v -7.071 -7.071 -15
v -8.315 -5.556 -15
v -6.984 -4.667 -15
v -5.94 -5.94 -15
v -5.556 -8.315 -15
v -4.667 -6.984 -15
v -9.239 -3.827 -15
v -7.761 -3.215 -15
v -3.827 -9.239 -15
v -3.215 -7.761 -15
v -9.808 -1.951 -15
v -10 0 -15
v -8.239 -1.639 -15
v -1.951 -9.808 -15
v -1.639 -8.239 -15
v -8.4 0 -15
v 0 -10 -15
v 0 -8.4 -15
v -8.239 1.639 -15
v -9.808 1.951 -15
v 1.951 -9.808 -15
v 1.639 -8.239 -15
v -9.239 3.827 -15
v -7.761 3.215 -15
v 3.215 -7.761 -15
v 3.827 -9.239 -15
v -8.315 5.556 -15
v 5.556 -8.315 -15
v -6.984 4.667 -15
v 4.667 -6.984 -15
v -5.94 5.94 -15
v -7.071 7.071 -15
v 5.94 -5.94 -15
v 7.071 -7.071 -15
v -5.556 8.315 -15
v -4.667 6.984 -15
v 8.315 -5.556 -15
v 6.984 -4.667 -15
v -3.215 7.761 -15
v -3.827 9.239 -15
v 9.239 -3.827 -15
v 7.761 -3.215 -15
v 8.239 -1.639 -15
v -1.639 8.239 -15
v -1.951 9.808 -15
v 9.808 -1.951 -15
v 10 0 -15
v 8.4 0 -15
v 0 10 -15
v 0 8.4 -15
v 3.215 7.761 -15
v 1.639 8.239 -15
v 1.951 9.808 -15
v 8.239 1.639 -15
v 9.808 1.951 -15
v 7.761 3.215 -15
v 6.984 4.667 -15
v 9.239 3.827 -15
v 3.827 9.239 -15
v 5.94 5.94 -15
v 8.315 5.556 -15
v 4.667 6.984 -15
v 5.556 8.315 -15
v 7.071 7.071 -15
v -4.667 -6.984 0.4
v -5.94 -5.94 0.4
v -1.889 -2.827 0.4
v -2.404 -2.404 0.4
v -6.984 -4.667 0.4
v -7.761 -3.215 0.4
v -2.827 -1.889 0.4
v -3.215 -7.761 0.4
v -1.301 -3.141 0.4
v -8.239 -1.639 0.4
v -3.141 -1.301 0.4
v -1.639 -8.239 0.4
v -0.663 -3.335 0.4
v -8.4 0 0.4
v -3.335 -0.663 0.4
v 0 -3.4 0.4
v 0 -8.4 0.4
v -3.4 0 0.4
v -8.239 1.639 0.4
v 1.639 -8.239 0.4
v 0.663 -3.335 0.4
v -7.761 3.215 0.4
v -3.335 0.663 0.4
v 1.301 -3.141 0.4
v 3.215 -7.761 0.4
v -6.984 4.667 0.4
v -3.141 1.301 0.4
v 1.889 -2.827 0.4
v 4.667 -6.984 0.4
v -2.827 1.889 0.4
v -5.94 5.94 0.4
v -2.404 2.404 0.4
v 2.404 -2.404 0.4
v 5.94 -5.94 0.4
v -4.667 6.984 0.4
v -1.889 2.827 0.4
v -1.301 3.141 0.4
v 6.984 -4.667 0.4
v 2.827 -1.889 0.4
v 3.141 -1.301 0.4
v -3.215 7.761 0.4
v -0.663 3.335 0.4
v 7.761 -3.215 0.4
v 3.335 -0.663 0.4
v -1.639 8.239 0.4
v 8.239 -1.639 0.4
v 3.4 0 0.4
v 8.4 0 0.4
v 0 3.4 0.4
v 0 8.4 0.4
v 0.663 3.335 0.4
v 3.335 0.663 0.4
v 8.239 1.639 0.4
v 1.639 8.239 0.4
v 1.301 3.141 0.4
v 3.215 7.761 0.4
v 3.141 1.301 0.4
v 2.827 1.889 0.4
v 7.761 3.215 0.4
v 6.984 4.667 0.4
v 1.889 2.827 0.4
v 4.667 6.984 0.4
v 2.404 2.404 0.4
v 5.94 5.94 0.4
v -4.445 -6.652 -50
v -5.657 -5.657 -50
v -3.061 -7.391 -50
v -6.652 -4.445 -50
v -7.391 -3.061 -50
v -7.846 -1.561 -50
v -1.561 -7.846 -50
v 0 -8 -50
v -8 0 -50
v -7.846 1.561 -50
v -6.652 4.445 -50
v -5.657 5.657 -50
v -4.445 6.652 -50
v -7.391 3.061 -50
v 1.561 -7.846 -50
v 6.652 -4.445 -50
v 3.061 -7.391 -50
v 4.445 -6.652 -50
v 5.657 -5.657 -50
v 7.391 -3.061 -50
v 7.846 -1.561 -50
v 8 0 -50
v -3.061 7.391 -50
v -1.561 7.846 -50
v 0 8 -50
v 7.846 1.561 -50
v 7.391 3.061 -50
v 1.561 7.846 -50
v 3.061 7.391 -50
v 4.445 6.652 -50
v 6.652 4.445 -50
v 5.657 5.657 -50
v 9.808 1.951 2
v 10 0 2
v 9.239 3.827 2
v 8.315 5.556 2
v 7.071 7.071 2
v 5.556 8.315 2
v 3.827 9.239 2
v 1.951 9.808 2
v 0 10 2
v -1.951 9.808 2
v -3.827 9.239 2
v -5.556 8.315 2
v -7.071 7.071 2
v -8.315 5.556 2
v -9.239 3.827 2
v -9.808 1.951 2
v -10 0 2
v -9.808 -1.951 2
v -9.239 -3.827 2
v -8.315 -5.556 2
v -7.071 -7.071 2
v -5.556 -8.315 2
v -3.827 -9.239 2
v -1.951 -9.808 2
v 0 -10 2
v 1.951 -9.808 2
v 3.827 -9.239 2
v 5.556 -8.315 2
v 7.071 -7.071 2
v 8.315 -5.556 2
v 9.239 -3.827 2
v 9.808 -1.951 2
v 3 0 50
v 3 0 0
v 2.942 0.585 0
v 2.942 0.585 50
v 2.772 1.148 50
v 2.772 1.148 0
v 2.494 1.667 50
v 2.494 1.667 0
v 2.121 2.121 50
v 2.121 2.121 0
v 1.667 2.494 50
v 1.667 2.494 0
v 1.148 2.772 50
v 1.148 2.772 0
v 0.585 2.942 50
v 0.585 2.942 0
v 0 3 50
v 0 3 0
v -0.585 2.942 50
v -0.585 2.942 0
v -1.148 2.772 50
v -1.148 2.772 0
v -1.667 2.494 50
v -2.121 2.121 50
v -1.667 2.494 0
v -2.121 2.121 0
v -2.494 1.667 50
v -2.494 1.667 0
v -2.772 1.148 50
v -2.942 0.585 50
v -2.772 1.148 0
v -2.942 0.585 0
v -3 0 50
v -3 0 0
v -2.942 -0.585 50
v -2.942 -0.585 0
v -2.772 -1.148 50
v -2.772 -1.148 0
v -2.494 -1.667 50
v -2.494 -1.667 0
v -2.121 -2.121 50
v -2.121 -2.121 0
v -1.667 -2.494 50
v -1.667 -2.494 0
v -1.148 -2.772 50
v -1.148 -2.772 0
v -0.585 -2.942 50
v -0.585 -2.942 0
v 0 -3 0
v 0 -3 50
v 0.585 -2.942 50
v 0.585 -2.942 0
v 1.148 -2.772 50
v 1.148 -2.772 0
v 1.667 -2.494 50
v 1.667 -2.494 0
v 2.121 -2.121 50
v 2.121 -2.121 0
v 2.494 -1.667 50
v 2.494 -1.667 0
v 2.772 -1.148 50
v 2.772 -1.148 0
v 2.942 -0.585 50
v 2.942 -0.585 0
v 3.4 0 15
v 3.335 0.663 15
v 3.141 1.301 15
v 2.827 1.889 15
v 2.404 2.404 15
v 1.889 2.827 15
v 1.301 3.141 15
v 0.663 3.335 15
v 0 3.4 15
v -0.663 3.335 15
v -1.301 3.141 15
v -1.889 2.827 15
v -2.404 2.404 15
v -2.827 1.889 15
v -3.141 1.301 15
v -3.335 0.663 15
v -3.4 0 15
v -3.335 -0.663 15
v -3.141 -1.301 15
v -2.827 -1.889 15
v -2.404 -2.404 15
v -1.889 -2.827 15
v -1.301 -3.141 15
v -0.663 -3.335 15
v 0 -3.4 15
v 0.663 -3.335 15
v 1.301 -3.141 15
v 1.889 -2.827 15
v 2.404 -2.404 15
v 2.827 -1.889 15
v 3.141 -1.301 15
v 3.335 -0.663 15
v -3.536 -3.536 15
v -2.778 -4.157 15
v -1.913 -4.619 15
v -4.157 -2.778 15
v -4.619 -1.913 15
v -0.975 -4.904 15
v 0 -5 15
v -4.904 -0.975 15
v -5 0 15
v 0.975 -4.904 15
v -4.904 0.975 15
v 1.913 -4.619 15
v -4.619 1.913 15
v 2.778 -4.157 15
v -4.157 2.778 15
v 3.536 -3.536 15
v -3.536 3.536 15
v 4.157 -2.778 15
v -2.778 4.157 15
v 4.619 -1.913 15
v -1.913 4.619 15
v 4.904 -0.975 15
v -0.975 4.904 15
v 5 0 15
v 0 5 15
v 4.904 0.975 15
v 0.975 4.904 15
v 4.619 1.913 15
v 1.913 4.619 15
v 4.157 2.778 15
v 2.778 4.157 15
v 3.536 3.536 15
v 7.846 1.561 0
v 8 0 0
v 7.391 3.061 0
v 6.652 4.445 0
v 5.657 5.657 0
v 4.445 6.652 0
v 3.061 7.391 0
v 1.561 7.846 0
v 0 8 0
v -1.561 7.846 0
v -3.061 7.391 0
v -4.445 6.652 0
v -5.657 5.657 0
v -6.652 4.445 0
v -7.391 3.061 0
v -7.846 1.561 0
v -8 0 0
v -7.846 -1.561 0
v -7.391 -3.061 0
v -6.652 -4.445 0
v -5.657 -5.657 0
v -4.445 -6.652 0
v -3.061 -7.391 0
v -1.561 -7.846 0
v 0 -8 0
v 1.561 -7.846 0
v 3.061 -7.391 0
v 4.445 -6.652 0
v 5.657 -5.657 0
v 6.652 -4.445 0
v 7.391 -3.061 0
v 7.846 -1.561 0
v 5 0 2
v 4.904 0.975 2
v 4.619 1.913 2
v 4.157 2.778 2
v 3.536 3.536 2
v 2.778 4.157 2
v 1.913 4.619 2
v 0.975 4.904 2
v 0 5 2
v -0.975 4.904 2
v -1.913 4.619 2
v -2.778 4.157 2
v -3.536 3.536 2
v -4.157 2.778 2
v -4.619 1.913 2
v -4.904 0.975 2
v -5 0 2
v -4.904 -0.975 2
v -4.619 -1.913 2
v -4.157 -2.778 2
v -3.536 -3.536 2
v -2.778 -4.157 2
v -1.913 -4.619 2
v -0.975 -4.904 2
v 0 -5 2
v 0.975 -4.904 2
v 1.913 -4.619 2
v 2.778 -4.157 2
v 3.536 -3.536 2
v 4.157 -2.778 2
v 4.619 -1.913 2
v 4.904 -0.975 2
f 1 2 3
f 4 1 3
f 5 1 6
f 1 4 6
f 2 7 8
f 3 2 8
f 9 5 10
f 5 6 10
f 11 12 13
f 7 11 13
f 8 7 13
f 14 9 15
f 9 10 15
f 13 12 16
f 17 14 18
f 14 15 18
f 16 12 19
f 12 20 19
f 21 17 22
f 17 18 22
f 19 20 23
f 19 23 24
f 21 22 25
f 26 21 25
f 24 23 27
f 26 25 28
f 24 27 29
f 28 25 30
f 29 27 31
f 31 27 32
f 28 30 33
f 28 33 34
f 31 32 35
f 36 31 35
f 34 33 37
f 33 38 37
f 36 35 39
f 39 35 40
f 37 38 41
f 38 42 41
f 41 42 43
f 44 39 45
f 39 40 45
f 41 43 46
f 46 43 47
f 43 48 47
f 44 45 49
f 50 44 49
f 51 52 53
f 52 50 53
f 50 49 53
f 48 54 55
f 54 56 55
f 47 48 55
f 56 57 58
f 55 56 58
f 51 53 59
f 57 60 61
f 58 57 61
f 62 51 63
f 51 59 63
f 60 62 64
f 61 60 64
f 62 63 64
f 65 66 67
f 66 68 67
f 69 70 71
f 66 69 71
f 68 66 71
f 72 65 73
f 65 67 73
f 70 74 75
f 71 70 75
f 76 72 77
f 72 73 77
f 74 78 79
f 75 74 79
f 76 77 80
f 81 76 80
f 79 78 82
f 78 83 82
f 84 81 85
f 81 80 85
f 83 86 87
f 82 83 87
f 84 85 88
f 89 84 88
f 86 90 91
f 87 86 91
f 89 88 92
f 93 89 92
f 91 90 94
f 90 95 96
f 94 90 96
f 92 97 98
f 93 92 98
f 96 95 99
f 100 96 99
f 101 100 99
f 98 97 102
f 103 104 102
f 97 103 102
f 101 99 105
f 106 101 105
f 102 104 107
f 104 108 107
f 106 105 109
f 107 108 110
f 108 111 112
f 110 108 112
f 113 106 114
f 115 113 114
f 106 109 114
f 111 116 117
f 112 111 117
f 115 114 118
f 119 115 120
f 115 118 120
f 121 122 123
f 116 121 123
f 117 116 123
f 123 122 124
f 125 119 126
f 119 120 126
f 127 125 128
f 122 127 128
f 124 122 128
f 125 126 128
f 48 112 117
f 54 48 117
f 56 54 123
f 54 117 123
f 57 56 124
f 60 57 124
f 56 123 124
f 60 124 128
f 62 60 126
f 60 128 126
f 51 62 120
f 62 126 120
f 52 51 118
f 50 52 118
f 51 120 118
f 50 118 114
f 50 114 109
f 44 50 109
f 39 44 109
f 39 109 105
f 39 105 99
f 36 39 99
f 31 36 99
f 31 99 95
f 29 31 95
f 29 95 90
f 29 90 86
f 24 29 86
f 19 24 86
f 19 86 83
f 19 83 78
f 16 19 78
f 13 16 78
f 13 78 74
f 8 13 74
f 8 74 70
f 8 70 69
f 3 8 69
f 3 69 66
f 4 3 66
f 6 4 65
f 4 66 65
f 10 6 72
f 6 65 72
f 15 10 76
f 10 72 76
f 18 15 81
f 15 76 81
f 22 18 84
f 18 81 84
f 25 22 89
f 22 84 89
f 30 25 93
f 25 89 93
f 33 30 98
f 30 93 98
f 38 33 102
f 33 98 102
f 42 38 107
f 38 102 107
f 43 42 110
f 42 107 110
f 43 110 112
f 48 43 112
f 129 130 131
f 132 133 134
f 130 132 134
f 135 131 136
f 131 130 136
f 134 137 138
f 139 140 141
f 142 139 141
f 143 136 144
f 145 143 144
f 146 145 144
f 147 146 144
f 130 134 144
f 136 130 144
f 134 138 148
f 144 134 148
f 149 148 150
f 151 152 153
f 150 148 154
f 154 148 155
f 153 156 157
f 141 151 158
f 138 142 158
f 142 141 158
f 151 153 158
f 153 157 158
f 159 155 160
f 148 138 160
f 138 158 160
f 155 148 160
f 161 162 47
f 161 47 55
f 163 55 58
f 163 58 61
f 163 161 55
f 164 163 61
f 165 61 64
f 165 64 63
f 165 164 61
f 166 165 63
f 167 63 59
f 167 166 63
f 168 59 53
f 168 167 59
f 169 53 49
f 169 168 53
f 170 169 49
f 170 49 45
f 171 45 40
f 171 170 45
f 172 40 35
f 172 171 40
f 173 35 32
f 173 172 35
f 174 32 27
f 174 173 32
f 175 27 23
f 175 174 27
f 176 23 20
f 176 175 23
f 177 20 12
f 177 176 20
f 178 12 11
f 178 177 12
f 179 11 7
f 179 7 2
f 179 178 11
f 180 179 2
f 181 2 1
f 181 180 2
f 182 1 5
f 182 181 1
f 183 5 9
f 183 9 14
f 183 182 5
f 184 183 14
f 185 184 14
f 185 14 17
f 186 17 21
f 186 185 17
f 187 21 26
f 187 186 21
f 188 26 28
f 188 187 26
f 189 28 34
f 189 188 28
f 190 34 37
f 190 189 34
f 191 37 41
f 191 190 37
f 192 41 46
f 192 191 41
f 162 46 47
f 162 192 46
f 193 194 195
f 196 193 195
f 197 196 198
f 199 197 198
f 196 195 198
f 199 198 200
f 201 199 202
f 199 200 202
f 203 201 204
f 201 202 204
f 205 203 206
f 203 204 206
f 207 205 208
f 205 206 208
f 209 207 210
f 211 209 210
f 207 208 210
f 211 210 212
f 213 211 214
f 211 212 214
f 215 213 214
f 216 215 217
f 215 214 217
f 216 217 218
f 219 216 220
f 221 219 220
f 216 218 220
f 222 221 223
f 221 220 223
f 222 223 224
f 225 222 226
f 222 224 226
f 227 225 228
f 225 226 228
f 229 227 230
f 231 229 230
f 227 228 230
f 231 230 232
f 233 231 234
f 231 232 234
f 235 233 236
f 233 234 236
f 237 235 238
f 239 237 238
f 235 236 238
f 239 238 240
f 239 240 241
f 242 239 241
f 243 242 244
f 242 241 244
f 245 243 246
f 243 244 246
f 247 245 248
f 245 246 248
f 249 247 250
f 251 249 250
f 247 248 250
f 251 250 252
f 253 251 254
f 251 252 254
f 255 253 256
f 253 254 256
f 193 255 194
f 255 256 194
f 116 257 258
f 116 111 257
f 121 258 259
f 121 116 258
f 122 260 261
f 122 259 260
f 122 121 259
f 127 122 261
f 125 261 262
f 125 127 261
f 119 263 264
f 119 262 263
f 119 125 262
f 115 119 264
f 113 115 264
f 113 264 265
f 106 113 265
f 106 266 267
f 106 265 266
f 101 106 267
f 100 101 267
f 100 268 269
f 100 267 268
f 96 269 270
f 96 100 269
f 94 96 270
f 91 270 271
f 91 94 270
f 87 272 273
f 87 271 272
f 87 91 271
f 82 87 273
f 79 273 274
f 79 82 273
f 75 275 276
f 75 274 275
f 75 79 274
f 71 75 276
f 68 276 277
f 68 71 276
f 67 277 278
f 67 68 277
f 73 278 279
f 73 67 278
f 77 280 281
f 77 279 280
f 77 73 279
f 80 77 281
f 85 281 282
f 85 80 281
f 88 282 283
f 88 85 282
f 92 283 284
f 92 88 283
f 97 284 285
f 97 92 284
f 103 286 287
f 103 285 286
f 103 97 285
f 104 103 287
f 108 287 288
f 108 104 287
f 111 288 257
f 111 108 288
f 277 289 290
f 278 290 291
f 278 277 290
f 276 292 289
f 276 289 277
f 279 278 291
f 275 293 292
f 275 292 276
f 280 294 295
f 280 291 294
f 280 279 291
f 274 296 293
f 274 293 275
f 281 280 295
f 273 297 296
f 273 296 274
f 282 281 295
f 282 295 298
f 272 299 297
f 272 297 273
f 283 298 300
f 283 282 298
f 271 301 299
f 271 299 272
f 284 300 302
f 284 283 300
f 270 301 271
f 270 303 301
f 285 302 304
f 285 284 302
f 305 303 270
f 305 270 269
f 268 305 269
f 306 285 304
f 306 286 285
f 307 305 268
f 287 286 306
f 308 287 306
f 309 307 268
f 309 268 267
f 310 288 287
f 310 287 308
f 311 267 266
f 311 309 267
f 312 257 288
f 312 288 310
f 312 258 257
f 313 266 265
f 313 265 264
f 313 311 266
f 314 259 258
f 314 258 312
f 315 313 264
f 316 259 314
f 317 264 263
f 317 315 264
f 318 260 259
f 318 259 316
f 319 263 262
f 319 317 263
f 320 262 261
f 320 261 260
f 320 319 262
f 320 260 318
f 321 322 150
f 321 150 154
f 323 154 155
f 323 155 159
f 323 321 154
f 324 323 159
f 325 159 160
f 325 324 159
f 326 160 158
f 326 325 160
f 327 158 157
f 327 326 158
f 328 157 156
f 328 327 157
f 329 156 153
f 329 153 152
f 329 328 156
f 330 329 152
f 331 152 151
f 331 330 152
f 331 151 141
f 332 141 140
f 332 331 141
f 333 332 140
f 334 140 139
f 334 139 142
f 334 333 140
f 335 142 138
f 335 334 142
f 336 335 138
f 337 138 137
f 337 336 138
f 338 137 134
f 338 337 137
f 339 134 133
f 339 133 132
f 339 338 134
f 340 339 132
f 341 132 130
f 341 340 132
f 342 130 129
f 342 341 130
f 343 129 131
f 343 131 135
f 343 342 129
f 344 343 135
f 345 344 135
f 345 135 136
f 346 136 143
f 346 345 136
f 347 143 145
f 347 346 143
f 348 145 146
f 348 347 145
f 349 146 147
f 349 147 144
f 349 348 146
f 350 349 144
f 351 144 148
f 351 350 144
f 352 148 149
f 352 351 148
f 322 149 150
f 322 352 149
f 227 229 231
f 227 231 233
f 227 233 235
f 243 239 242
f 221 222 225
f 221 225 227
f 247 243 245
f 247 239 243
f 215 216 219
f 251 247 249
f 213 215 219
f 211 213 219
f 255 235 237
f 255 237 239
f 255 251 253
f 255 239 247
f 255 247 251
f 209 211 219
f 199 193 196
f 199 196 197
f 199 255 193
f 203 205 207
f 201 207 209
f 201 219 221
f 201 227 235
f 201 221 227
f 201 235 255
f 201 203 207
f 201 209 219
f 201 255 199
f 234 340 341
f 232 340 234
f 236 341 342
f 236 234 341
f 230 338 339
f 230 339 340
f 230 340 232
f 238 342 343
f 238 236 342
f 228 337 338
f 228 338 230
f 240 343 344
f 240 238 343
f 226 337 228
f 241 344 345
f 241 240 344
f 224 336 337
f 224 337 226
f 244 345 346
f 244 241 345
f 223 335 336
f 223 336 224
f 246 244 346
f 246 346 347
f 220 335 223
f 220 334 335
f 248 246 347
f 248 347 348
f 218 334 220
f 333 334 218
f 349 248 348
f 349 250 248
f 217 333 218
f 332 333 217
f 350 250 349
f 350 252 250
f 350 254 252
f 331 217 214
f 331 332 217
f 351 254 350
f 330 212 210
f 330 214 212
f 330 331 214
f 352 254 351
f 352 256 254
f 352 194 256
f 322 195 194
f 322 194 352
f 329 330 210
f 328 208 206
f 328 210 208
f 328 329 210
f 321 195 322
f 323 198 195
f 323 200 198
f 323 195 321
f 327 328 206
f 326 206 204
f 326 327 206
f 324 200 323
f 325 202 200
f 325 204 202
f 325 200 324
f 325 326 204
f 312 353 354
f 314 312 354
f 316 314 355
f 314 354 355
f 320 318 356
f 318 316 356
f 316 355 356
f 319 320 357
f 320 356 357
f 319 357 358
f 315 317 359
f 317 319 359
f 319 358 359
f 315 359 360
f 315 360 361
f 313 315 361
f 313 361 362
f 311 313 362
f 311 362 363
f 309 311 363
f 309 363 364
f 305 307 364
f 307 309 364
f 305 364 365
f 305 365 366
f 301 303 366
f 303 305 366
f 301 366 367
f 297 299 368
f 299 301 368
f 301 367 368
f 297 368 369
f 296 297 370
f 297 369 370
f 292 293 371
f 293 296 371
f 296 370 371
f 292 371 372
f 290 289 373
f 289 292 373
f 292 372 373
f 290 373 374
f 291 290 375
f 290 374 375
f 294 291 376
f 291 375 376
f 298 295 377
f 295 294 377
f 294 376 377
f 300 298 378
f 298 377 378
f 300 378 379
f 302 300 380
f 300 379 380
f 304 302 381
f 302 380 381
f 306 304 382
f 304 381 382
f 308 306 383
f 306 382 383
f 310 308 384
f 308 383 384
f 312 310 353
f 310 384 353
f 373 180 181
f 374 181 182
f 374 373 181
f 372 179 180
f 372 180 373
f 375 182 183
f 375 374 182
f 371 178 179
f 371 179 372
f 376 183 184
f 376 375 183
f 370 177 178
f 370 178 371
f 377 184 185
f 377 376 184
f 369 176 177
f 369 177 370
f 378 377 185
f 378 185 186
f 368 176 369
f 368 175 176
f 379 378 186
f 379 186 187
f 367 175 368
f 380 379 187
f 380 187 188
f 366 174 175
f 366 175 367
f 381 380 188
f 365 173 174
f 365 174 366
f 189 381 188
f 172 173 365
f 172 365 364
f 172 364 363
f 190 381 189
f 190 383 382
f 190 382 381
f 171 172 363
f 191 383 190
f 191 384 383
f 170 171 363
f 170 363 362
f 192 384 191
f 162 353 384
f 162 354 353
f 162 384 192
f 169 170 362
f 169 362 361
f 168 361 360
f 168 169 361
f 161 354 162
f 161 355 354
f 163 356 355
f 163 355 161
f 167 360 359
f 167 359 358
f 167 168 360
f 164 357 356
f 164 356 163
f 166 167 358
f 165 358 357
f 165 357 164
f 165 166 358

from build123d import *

# Parameters (mm, degrees)
F0_R      = 3
F1_DEPTH  = 50
F0_R_2    = 8
F2_DEPTH  = 50
F3_R      = 10
F4_DEPTH  = 15
F5_OFFSET = 0.4
F6_T      = 1.6


# Not quite as in the source:
# - a shell that OpenCascade refuses in one call is made with other operations: the cavity is built on its own and cut out


with BuildPart() as f1:
    # F0 (on Top) → F1 (new body)
    with BuildSketch(Plane.XY):
        Circle(F0_R)
    extrude(amount=F1_DEPTH)

    # F0 (on Top) → F2 (join)
    with BuildSketch(Plane.XY):
        Circle(F0_R_2)
        Circle(F0_R, mode=Mode.SUBTRACT)
        Circle(F0_R)
    extrude(amount=-F2_DEPTH)


with BuildPart() as f4:
    # F3 (on face) → F4 (new body, symmetric)
    with BuildSketch(Plane.XY):
        Circle(F3_R)
    extrude(amount=F4_DEPTH, both=True)

    # F5: cut F1, made larger all round first
    f5_tool = offset(f1.part, amount=F5_OFFSET, kind=Kind.INTERSECTION, mode=Mode.PRIVATE)
    add(f5_tool, mode=Mode.SUBTRACT)

    # F6: shell of thickness 1.6, made by hand


with BuildPart() as f6_core1:
    # F6_t2: copy of F4
    add(f4.part)

    # the walls: a layer under each face that stays
    f6_faces = [f6_core1.faces().sort_by_distance(p)[0] for p in [
        (-6.6666666667, -6.6666666667, -15),
        (-8.4, 0, -7.3),
        (-3.4, 0, 7.7),
        (-5.6, -5.6, 0.4),
    ]]
    thicken(f6_faces, amount=-F6_T, mode=Mode.SUBTRACT)

    # F6_s3 → F6_t4 (revolve, cut)
    with BuildSketch(Plane.XZ):
        Polygon((8.384, 0.384), (10, 0.4), (10, 2), (8.4, 2), align=None)
    revolve(axis=Axis((0, 0, 0.4), (0, 0, 1)), mode=Mode.SUBTRACT)


with BuildPart() as f4_1:
    add(f4.part)

    # what is left inside the walls is the cavity
    f6_cavity = [f6_core1.part.solids().sort_by_distance(p)[0] for p in [
        (-9.984, 0, 6.333333),
    ]]
    add(f6_cavity, mode=Mode.SUBTRACT)


solid = Compound([f1.part, f4_1.part])
